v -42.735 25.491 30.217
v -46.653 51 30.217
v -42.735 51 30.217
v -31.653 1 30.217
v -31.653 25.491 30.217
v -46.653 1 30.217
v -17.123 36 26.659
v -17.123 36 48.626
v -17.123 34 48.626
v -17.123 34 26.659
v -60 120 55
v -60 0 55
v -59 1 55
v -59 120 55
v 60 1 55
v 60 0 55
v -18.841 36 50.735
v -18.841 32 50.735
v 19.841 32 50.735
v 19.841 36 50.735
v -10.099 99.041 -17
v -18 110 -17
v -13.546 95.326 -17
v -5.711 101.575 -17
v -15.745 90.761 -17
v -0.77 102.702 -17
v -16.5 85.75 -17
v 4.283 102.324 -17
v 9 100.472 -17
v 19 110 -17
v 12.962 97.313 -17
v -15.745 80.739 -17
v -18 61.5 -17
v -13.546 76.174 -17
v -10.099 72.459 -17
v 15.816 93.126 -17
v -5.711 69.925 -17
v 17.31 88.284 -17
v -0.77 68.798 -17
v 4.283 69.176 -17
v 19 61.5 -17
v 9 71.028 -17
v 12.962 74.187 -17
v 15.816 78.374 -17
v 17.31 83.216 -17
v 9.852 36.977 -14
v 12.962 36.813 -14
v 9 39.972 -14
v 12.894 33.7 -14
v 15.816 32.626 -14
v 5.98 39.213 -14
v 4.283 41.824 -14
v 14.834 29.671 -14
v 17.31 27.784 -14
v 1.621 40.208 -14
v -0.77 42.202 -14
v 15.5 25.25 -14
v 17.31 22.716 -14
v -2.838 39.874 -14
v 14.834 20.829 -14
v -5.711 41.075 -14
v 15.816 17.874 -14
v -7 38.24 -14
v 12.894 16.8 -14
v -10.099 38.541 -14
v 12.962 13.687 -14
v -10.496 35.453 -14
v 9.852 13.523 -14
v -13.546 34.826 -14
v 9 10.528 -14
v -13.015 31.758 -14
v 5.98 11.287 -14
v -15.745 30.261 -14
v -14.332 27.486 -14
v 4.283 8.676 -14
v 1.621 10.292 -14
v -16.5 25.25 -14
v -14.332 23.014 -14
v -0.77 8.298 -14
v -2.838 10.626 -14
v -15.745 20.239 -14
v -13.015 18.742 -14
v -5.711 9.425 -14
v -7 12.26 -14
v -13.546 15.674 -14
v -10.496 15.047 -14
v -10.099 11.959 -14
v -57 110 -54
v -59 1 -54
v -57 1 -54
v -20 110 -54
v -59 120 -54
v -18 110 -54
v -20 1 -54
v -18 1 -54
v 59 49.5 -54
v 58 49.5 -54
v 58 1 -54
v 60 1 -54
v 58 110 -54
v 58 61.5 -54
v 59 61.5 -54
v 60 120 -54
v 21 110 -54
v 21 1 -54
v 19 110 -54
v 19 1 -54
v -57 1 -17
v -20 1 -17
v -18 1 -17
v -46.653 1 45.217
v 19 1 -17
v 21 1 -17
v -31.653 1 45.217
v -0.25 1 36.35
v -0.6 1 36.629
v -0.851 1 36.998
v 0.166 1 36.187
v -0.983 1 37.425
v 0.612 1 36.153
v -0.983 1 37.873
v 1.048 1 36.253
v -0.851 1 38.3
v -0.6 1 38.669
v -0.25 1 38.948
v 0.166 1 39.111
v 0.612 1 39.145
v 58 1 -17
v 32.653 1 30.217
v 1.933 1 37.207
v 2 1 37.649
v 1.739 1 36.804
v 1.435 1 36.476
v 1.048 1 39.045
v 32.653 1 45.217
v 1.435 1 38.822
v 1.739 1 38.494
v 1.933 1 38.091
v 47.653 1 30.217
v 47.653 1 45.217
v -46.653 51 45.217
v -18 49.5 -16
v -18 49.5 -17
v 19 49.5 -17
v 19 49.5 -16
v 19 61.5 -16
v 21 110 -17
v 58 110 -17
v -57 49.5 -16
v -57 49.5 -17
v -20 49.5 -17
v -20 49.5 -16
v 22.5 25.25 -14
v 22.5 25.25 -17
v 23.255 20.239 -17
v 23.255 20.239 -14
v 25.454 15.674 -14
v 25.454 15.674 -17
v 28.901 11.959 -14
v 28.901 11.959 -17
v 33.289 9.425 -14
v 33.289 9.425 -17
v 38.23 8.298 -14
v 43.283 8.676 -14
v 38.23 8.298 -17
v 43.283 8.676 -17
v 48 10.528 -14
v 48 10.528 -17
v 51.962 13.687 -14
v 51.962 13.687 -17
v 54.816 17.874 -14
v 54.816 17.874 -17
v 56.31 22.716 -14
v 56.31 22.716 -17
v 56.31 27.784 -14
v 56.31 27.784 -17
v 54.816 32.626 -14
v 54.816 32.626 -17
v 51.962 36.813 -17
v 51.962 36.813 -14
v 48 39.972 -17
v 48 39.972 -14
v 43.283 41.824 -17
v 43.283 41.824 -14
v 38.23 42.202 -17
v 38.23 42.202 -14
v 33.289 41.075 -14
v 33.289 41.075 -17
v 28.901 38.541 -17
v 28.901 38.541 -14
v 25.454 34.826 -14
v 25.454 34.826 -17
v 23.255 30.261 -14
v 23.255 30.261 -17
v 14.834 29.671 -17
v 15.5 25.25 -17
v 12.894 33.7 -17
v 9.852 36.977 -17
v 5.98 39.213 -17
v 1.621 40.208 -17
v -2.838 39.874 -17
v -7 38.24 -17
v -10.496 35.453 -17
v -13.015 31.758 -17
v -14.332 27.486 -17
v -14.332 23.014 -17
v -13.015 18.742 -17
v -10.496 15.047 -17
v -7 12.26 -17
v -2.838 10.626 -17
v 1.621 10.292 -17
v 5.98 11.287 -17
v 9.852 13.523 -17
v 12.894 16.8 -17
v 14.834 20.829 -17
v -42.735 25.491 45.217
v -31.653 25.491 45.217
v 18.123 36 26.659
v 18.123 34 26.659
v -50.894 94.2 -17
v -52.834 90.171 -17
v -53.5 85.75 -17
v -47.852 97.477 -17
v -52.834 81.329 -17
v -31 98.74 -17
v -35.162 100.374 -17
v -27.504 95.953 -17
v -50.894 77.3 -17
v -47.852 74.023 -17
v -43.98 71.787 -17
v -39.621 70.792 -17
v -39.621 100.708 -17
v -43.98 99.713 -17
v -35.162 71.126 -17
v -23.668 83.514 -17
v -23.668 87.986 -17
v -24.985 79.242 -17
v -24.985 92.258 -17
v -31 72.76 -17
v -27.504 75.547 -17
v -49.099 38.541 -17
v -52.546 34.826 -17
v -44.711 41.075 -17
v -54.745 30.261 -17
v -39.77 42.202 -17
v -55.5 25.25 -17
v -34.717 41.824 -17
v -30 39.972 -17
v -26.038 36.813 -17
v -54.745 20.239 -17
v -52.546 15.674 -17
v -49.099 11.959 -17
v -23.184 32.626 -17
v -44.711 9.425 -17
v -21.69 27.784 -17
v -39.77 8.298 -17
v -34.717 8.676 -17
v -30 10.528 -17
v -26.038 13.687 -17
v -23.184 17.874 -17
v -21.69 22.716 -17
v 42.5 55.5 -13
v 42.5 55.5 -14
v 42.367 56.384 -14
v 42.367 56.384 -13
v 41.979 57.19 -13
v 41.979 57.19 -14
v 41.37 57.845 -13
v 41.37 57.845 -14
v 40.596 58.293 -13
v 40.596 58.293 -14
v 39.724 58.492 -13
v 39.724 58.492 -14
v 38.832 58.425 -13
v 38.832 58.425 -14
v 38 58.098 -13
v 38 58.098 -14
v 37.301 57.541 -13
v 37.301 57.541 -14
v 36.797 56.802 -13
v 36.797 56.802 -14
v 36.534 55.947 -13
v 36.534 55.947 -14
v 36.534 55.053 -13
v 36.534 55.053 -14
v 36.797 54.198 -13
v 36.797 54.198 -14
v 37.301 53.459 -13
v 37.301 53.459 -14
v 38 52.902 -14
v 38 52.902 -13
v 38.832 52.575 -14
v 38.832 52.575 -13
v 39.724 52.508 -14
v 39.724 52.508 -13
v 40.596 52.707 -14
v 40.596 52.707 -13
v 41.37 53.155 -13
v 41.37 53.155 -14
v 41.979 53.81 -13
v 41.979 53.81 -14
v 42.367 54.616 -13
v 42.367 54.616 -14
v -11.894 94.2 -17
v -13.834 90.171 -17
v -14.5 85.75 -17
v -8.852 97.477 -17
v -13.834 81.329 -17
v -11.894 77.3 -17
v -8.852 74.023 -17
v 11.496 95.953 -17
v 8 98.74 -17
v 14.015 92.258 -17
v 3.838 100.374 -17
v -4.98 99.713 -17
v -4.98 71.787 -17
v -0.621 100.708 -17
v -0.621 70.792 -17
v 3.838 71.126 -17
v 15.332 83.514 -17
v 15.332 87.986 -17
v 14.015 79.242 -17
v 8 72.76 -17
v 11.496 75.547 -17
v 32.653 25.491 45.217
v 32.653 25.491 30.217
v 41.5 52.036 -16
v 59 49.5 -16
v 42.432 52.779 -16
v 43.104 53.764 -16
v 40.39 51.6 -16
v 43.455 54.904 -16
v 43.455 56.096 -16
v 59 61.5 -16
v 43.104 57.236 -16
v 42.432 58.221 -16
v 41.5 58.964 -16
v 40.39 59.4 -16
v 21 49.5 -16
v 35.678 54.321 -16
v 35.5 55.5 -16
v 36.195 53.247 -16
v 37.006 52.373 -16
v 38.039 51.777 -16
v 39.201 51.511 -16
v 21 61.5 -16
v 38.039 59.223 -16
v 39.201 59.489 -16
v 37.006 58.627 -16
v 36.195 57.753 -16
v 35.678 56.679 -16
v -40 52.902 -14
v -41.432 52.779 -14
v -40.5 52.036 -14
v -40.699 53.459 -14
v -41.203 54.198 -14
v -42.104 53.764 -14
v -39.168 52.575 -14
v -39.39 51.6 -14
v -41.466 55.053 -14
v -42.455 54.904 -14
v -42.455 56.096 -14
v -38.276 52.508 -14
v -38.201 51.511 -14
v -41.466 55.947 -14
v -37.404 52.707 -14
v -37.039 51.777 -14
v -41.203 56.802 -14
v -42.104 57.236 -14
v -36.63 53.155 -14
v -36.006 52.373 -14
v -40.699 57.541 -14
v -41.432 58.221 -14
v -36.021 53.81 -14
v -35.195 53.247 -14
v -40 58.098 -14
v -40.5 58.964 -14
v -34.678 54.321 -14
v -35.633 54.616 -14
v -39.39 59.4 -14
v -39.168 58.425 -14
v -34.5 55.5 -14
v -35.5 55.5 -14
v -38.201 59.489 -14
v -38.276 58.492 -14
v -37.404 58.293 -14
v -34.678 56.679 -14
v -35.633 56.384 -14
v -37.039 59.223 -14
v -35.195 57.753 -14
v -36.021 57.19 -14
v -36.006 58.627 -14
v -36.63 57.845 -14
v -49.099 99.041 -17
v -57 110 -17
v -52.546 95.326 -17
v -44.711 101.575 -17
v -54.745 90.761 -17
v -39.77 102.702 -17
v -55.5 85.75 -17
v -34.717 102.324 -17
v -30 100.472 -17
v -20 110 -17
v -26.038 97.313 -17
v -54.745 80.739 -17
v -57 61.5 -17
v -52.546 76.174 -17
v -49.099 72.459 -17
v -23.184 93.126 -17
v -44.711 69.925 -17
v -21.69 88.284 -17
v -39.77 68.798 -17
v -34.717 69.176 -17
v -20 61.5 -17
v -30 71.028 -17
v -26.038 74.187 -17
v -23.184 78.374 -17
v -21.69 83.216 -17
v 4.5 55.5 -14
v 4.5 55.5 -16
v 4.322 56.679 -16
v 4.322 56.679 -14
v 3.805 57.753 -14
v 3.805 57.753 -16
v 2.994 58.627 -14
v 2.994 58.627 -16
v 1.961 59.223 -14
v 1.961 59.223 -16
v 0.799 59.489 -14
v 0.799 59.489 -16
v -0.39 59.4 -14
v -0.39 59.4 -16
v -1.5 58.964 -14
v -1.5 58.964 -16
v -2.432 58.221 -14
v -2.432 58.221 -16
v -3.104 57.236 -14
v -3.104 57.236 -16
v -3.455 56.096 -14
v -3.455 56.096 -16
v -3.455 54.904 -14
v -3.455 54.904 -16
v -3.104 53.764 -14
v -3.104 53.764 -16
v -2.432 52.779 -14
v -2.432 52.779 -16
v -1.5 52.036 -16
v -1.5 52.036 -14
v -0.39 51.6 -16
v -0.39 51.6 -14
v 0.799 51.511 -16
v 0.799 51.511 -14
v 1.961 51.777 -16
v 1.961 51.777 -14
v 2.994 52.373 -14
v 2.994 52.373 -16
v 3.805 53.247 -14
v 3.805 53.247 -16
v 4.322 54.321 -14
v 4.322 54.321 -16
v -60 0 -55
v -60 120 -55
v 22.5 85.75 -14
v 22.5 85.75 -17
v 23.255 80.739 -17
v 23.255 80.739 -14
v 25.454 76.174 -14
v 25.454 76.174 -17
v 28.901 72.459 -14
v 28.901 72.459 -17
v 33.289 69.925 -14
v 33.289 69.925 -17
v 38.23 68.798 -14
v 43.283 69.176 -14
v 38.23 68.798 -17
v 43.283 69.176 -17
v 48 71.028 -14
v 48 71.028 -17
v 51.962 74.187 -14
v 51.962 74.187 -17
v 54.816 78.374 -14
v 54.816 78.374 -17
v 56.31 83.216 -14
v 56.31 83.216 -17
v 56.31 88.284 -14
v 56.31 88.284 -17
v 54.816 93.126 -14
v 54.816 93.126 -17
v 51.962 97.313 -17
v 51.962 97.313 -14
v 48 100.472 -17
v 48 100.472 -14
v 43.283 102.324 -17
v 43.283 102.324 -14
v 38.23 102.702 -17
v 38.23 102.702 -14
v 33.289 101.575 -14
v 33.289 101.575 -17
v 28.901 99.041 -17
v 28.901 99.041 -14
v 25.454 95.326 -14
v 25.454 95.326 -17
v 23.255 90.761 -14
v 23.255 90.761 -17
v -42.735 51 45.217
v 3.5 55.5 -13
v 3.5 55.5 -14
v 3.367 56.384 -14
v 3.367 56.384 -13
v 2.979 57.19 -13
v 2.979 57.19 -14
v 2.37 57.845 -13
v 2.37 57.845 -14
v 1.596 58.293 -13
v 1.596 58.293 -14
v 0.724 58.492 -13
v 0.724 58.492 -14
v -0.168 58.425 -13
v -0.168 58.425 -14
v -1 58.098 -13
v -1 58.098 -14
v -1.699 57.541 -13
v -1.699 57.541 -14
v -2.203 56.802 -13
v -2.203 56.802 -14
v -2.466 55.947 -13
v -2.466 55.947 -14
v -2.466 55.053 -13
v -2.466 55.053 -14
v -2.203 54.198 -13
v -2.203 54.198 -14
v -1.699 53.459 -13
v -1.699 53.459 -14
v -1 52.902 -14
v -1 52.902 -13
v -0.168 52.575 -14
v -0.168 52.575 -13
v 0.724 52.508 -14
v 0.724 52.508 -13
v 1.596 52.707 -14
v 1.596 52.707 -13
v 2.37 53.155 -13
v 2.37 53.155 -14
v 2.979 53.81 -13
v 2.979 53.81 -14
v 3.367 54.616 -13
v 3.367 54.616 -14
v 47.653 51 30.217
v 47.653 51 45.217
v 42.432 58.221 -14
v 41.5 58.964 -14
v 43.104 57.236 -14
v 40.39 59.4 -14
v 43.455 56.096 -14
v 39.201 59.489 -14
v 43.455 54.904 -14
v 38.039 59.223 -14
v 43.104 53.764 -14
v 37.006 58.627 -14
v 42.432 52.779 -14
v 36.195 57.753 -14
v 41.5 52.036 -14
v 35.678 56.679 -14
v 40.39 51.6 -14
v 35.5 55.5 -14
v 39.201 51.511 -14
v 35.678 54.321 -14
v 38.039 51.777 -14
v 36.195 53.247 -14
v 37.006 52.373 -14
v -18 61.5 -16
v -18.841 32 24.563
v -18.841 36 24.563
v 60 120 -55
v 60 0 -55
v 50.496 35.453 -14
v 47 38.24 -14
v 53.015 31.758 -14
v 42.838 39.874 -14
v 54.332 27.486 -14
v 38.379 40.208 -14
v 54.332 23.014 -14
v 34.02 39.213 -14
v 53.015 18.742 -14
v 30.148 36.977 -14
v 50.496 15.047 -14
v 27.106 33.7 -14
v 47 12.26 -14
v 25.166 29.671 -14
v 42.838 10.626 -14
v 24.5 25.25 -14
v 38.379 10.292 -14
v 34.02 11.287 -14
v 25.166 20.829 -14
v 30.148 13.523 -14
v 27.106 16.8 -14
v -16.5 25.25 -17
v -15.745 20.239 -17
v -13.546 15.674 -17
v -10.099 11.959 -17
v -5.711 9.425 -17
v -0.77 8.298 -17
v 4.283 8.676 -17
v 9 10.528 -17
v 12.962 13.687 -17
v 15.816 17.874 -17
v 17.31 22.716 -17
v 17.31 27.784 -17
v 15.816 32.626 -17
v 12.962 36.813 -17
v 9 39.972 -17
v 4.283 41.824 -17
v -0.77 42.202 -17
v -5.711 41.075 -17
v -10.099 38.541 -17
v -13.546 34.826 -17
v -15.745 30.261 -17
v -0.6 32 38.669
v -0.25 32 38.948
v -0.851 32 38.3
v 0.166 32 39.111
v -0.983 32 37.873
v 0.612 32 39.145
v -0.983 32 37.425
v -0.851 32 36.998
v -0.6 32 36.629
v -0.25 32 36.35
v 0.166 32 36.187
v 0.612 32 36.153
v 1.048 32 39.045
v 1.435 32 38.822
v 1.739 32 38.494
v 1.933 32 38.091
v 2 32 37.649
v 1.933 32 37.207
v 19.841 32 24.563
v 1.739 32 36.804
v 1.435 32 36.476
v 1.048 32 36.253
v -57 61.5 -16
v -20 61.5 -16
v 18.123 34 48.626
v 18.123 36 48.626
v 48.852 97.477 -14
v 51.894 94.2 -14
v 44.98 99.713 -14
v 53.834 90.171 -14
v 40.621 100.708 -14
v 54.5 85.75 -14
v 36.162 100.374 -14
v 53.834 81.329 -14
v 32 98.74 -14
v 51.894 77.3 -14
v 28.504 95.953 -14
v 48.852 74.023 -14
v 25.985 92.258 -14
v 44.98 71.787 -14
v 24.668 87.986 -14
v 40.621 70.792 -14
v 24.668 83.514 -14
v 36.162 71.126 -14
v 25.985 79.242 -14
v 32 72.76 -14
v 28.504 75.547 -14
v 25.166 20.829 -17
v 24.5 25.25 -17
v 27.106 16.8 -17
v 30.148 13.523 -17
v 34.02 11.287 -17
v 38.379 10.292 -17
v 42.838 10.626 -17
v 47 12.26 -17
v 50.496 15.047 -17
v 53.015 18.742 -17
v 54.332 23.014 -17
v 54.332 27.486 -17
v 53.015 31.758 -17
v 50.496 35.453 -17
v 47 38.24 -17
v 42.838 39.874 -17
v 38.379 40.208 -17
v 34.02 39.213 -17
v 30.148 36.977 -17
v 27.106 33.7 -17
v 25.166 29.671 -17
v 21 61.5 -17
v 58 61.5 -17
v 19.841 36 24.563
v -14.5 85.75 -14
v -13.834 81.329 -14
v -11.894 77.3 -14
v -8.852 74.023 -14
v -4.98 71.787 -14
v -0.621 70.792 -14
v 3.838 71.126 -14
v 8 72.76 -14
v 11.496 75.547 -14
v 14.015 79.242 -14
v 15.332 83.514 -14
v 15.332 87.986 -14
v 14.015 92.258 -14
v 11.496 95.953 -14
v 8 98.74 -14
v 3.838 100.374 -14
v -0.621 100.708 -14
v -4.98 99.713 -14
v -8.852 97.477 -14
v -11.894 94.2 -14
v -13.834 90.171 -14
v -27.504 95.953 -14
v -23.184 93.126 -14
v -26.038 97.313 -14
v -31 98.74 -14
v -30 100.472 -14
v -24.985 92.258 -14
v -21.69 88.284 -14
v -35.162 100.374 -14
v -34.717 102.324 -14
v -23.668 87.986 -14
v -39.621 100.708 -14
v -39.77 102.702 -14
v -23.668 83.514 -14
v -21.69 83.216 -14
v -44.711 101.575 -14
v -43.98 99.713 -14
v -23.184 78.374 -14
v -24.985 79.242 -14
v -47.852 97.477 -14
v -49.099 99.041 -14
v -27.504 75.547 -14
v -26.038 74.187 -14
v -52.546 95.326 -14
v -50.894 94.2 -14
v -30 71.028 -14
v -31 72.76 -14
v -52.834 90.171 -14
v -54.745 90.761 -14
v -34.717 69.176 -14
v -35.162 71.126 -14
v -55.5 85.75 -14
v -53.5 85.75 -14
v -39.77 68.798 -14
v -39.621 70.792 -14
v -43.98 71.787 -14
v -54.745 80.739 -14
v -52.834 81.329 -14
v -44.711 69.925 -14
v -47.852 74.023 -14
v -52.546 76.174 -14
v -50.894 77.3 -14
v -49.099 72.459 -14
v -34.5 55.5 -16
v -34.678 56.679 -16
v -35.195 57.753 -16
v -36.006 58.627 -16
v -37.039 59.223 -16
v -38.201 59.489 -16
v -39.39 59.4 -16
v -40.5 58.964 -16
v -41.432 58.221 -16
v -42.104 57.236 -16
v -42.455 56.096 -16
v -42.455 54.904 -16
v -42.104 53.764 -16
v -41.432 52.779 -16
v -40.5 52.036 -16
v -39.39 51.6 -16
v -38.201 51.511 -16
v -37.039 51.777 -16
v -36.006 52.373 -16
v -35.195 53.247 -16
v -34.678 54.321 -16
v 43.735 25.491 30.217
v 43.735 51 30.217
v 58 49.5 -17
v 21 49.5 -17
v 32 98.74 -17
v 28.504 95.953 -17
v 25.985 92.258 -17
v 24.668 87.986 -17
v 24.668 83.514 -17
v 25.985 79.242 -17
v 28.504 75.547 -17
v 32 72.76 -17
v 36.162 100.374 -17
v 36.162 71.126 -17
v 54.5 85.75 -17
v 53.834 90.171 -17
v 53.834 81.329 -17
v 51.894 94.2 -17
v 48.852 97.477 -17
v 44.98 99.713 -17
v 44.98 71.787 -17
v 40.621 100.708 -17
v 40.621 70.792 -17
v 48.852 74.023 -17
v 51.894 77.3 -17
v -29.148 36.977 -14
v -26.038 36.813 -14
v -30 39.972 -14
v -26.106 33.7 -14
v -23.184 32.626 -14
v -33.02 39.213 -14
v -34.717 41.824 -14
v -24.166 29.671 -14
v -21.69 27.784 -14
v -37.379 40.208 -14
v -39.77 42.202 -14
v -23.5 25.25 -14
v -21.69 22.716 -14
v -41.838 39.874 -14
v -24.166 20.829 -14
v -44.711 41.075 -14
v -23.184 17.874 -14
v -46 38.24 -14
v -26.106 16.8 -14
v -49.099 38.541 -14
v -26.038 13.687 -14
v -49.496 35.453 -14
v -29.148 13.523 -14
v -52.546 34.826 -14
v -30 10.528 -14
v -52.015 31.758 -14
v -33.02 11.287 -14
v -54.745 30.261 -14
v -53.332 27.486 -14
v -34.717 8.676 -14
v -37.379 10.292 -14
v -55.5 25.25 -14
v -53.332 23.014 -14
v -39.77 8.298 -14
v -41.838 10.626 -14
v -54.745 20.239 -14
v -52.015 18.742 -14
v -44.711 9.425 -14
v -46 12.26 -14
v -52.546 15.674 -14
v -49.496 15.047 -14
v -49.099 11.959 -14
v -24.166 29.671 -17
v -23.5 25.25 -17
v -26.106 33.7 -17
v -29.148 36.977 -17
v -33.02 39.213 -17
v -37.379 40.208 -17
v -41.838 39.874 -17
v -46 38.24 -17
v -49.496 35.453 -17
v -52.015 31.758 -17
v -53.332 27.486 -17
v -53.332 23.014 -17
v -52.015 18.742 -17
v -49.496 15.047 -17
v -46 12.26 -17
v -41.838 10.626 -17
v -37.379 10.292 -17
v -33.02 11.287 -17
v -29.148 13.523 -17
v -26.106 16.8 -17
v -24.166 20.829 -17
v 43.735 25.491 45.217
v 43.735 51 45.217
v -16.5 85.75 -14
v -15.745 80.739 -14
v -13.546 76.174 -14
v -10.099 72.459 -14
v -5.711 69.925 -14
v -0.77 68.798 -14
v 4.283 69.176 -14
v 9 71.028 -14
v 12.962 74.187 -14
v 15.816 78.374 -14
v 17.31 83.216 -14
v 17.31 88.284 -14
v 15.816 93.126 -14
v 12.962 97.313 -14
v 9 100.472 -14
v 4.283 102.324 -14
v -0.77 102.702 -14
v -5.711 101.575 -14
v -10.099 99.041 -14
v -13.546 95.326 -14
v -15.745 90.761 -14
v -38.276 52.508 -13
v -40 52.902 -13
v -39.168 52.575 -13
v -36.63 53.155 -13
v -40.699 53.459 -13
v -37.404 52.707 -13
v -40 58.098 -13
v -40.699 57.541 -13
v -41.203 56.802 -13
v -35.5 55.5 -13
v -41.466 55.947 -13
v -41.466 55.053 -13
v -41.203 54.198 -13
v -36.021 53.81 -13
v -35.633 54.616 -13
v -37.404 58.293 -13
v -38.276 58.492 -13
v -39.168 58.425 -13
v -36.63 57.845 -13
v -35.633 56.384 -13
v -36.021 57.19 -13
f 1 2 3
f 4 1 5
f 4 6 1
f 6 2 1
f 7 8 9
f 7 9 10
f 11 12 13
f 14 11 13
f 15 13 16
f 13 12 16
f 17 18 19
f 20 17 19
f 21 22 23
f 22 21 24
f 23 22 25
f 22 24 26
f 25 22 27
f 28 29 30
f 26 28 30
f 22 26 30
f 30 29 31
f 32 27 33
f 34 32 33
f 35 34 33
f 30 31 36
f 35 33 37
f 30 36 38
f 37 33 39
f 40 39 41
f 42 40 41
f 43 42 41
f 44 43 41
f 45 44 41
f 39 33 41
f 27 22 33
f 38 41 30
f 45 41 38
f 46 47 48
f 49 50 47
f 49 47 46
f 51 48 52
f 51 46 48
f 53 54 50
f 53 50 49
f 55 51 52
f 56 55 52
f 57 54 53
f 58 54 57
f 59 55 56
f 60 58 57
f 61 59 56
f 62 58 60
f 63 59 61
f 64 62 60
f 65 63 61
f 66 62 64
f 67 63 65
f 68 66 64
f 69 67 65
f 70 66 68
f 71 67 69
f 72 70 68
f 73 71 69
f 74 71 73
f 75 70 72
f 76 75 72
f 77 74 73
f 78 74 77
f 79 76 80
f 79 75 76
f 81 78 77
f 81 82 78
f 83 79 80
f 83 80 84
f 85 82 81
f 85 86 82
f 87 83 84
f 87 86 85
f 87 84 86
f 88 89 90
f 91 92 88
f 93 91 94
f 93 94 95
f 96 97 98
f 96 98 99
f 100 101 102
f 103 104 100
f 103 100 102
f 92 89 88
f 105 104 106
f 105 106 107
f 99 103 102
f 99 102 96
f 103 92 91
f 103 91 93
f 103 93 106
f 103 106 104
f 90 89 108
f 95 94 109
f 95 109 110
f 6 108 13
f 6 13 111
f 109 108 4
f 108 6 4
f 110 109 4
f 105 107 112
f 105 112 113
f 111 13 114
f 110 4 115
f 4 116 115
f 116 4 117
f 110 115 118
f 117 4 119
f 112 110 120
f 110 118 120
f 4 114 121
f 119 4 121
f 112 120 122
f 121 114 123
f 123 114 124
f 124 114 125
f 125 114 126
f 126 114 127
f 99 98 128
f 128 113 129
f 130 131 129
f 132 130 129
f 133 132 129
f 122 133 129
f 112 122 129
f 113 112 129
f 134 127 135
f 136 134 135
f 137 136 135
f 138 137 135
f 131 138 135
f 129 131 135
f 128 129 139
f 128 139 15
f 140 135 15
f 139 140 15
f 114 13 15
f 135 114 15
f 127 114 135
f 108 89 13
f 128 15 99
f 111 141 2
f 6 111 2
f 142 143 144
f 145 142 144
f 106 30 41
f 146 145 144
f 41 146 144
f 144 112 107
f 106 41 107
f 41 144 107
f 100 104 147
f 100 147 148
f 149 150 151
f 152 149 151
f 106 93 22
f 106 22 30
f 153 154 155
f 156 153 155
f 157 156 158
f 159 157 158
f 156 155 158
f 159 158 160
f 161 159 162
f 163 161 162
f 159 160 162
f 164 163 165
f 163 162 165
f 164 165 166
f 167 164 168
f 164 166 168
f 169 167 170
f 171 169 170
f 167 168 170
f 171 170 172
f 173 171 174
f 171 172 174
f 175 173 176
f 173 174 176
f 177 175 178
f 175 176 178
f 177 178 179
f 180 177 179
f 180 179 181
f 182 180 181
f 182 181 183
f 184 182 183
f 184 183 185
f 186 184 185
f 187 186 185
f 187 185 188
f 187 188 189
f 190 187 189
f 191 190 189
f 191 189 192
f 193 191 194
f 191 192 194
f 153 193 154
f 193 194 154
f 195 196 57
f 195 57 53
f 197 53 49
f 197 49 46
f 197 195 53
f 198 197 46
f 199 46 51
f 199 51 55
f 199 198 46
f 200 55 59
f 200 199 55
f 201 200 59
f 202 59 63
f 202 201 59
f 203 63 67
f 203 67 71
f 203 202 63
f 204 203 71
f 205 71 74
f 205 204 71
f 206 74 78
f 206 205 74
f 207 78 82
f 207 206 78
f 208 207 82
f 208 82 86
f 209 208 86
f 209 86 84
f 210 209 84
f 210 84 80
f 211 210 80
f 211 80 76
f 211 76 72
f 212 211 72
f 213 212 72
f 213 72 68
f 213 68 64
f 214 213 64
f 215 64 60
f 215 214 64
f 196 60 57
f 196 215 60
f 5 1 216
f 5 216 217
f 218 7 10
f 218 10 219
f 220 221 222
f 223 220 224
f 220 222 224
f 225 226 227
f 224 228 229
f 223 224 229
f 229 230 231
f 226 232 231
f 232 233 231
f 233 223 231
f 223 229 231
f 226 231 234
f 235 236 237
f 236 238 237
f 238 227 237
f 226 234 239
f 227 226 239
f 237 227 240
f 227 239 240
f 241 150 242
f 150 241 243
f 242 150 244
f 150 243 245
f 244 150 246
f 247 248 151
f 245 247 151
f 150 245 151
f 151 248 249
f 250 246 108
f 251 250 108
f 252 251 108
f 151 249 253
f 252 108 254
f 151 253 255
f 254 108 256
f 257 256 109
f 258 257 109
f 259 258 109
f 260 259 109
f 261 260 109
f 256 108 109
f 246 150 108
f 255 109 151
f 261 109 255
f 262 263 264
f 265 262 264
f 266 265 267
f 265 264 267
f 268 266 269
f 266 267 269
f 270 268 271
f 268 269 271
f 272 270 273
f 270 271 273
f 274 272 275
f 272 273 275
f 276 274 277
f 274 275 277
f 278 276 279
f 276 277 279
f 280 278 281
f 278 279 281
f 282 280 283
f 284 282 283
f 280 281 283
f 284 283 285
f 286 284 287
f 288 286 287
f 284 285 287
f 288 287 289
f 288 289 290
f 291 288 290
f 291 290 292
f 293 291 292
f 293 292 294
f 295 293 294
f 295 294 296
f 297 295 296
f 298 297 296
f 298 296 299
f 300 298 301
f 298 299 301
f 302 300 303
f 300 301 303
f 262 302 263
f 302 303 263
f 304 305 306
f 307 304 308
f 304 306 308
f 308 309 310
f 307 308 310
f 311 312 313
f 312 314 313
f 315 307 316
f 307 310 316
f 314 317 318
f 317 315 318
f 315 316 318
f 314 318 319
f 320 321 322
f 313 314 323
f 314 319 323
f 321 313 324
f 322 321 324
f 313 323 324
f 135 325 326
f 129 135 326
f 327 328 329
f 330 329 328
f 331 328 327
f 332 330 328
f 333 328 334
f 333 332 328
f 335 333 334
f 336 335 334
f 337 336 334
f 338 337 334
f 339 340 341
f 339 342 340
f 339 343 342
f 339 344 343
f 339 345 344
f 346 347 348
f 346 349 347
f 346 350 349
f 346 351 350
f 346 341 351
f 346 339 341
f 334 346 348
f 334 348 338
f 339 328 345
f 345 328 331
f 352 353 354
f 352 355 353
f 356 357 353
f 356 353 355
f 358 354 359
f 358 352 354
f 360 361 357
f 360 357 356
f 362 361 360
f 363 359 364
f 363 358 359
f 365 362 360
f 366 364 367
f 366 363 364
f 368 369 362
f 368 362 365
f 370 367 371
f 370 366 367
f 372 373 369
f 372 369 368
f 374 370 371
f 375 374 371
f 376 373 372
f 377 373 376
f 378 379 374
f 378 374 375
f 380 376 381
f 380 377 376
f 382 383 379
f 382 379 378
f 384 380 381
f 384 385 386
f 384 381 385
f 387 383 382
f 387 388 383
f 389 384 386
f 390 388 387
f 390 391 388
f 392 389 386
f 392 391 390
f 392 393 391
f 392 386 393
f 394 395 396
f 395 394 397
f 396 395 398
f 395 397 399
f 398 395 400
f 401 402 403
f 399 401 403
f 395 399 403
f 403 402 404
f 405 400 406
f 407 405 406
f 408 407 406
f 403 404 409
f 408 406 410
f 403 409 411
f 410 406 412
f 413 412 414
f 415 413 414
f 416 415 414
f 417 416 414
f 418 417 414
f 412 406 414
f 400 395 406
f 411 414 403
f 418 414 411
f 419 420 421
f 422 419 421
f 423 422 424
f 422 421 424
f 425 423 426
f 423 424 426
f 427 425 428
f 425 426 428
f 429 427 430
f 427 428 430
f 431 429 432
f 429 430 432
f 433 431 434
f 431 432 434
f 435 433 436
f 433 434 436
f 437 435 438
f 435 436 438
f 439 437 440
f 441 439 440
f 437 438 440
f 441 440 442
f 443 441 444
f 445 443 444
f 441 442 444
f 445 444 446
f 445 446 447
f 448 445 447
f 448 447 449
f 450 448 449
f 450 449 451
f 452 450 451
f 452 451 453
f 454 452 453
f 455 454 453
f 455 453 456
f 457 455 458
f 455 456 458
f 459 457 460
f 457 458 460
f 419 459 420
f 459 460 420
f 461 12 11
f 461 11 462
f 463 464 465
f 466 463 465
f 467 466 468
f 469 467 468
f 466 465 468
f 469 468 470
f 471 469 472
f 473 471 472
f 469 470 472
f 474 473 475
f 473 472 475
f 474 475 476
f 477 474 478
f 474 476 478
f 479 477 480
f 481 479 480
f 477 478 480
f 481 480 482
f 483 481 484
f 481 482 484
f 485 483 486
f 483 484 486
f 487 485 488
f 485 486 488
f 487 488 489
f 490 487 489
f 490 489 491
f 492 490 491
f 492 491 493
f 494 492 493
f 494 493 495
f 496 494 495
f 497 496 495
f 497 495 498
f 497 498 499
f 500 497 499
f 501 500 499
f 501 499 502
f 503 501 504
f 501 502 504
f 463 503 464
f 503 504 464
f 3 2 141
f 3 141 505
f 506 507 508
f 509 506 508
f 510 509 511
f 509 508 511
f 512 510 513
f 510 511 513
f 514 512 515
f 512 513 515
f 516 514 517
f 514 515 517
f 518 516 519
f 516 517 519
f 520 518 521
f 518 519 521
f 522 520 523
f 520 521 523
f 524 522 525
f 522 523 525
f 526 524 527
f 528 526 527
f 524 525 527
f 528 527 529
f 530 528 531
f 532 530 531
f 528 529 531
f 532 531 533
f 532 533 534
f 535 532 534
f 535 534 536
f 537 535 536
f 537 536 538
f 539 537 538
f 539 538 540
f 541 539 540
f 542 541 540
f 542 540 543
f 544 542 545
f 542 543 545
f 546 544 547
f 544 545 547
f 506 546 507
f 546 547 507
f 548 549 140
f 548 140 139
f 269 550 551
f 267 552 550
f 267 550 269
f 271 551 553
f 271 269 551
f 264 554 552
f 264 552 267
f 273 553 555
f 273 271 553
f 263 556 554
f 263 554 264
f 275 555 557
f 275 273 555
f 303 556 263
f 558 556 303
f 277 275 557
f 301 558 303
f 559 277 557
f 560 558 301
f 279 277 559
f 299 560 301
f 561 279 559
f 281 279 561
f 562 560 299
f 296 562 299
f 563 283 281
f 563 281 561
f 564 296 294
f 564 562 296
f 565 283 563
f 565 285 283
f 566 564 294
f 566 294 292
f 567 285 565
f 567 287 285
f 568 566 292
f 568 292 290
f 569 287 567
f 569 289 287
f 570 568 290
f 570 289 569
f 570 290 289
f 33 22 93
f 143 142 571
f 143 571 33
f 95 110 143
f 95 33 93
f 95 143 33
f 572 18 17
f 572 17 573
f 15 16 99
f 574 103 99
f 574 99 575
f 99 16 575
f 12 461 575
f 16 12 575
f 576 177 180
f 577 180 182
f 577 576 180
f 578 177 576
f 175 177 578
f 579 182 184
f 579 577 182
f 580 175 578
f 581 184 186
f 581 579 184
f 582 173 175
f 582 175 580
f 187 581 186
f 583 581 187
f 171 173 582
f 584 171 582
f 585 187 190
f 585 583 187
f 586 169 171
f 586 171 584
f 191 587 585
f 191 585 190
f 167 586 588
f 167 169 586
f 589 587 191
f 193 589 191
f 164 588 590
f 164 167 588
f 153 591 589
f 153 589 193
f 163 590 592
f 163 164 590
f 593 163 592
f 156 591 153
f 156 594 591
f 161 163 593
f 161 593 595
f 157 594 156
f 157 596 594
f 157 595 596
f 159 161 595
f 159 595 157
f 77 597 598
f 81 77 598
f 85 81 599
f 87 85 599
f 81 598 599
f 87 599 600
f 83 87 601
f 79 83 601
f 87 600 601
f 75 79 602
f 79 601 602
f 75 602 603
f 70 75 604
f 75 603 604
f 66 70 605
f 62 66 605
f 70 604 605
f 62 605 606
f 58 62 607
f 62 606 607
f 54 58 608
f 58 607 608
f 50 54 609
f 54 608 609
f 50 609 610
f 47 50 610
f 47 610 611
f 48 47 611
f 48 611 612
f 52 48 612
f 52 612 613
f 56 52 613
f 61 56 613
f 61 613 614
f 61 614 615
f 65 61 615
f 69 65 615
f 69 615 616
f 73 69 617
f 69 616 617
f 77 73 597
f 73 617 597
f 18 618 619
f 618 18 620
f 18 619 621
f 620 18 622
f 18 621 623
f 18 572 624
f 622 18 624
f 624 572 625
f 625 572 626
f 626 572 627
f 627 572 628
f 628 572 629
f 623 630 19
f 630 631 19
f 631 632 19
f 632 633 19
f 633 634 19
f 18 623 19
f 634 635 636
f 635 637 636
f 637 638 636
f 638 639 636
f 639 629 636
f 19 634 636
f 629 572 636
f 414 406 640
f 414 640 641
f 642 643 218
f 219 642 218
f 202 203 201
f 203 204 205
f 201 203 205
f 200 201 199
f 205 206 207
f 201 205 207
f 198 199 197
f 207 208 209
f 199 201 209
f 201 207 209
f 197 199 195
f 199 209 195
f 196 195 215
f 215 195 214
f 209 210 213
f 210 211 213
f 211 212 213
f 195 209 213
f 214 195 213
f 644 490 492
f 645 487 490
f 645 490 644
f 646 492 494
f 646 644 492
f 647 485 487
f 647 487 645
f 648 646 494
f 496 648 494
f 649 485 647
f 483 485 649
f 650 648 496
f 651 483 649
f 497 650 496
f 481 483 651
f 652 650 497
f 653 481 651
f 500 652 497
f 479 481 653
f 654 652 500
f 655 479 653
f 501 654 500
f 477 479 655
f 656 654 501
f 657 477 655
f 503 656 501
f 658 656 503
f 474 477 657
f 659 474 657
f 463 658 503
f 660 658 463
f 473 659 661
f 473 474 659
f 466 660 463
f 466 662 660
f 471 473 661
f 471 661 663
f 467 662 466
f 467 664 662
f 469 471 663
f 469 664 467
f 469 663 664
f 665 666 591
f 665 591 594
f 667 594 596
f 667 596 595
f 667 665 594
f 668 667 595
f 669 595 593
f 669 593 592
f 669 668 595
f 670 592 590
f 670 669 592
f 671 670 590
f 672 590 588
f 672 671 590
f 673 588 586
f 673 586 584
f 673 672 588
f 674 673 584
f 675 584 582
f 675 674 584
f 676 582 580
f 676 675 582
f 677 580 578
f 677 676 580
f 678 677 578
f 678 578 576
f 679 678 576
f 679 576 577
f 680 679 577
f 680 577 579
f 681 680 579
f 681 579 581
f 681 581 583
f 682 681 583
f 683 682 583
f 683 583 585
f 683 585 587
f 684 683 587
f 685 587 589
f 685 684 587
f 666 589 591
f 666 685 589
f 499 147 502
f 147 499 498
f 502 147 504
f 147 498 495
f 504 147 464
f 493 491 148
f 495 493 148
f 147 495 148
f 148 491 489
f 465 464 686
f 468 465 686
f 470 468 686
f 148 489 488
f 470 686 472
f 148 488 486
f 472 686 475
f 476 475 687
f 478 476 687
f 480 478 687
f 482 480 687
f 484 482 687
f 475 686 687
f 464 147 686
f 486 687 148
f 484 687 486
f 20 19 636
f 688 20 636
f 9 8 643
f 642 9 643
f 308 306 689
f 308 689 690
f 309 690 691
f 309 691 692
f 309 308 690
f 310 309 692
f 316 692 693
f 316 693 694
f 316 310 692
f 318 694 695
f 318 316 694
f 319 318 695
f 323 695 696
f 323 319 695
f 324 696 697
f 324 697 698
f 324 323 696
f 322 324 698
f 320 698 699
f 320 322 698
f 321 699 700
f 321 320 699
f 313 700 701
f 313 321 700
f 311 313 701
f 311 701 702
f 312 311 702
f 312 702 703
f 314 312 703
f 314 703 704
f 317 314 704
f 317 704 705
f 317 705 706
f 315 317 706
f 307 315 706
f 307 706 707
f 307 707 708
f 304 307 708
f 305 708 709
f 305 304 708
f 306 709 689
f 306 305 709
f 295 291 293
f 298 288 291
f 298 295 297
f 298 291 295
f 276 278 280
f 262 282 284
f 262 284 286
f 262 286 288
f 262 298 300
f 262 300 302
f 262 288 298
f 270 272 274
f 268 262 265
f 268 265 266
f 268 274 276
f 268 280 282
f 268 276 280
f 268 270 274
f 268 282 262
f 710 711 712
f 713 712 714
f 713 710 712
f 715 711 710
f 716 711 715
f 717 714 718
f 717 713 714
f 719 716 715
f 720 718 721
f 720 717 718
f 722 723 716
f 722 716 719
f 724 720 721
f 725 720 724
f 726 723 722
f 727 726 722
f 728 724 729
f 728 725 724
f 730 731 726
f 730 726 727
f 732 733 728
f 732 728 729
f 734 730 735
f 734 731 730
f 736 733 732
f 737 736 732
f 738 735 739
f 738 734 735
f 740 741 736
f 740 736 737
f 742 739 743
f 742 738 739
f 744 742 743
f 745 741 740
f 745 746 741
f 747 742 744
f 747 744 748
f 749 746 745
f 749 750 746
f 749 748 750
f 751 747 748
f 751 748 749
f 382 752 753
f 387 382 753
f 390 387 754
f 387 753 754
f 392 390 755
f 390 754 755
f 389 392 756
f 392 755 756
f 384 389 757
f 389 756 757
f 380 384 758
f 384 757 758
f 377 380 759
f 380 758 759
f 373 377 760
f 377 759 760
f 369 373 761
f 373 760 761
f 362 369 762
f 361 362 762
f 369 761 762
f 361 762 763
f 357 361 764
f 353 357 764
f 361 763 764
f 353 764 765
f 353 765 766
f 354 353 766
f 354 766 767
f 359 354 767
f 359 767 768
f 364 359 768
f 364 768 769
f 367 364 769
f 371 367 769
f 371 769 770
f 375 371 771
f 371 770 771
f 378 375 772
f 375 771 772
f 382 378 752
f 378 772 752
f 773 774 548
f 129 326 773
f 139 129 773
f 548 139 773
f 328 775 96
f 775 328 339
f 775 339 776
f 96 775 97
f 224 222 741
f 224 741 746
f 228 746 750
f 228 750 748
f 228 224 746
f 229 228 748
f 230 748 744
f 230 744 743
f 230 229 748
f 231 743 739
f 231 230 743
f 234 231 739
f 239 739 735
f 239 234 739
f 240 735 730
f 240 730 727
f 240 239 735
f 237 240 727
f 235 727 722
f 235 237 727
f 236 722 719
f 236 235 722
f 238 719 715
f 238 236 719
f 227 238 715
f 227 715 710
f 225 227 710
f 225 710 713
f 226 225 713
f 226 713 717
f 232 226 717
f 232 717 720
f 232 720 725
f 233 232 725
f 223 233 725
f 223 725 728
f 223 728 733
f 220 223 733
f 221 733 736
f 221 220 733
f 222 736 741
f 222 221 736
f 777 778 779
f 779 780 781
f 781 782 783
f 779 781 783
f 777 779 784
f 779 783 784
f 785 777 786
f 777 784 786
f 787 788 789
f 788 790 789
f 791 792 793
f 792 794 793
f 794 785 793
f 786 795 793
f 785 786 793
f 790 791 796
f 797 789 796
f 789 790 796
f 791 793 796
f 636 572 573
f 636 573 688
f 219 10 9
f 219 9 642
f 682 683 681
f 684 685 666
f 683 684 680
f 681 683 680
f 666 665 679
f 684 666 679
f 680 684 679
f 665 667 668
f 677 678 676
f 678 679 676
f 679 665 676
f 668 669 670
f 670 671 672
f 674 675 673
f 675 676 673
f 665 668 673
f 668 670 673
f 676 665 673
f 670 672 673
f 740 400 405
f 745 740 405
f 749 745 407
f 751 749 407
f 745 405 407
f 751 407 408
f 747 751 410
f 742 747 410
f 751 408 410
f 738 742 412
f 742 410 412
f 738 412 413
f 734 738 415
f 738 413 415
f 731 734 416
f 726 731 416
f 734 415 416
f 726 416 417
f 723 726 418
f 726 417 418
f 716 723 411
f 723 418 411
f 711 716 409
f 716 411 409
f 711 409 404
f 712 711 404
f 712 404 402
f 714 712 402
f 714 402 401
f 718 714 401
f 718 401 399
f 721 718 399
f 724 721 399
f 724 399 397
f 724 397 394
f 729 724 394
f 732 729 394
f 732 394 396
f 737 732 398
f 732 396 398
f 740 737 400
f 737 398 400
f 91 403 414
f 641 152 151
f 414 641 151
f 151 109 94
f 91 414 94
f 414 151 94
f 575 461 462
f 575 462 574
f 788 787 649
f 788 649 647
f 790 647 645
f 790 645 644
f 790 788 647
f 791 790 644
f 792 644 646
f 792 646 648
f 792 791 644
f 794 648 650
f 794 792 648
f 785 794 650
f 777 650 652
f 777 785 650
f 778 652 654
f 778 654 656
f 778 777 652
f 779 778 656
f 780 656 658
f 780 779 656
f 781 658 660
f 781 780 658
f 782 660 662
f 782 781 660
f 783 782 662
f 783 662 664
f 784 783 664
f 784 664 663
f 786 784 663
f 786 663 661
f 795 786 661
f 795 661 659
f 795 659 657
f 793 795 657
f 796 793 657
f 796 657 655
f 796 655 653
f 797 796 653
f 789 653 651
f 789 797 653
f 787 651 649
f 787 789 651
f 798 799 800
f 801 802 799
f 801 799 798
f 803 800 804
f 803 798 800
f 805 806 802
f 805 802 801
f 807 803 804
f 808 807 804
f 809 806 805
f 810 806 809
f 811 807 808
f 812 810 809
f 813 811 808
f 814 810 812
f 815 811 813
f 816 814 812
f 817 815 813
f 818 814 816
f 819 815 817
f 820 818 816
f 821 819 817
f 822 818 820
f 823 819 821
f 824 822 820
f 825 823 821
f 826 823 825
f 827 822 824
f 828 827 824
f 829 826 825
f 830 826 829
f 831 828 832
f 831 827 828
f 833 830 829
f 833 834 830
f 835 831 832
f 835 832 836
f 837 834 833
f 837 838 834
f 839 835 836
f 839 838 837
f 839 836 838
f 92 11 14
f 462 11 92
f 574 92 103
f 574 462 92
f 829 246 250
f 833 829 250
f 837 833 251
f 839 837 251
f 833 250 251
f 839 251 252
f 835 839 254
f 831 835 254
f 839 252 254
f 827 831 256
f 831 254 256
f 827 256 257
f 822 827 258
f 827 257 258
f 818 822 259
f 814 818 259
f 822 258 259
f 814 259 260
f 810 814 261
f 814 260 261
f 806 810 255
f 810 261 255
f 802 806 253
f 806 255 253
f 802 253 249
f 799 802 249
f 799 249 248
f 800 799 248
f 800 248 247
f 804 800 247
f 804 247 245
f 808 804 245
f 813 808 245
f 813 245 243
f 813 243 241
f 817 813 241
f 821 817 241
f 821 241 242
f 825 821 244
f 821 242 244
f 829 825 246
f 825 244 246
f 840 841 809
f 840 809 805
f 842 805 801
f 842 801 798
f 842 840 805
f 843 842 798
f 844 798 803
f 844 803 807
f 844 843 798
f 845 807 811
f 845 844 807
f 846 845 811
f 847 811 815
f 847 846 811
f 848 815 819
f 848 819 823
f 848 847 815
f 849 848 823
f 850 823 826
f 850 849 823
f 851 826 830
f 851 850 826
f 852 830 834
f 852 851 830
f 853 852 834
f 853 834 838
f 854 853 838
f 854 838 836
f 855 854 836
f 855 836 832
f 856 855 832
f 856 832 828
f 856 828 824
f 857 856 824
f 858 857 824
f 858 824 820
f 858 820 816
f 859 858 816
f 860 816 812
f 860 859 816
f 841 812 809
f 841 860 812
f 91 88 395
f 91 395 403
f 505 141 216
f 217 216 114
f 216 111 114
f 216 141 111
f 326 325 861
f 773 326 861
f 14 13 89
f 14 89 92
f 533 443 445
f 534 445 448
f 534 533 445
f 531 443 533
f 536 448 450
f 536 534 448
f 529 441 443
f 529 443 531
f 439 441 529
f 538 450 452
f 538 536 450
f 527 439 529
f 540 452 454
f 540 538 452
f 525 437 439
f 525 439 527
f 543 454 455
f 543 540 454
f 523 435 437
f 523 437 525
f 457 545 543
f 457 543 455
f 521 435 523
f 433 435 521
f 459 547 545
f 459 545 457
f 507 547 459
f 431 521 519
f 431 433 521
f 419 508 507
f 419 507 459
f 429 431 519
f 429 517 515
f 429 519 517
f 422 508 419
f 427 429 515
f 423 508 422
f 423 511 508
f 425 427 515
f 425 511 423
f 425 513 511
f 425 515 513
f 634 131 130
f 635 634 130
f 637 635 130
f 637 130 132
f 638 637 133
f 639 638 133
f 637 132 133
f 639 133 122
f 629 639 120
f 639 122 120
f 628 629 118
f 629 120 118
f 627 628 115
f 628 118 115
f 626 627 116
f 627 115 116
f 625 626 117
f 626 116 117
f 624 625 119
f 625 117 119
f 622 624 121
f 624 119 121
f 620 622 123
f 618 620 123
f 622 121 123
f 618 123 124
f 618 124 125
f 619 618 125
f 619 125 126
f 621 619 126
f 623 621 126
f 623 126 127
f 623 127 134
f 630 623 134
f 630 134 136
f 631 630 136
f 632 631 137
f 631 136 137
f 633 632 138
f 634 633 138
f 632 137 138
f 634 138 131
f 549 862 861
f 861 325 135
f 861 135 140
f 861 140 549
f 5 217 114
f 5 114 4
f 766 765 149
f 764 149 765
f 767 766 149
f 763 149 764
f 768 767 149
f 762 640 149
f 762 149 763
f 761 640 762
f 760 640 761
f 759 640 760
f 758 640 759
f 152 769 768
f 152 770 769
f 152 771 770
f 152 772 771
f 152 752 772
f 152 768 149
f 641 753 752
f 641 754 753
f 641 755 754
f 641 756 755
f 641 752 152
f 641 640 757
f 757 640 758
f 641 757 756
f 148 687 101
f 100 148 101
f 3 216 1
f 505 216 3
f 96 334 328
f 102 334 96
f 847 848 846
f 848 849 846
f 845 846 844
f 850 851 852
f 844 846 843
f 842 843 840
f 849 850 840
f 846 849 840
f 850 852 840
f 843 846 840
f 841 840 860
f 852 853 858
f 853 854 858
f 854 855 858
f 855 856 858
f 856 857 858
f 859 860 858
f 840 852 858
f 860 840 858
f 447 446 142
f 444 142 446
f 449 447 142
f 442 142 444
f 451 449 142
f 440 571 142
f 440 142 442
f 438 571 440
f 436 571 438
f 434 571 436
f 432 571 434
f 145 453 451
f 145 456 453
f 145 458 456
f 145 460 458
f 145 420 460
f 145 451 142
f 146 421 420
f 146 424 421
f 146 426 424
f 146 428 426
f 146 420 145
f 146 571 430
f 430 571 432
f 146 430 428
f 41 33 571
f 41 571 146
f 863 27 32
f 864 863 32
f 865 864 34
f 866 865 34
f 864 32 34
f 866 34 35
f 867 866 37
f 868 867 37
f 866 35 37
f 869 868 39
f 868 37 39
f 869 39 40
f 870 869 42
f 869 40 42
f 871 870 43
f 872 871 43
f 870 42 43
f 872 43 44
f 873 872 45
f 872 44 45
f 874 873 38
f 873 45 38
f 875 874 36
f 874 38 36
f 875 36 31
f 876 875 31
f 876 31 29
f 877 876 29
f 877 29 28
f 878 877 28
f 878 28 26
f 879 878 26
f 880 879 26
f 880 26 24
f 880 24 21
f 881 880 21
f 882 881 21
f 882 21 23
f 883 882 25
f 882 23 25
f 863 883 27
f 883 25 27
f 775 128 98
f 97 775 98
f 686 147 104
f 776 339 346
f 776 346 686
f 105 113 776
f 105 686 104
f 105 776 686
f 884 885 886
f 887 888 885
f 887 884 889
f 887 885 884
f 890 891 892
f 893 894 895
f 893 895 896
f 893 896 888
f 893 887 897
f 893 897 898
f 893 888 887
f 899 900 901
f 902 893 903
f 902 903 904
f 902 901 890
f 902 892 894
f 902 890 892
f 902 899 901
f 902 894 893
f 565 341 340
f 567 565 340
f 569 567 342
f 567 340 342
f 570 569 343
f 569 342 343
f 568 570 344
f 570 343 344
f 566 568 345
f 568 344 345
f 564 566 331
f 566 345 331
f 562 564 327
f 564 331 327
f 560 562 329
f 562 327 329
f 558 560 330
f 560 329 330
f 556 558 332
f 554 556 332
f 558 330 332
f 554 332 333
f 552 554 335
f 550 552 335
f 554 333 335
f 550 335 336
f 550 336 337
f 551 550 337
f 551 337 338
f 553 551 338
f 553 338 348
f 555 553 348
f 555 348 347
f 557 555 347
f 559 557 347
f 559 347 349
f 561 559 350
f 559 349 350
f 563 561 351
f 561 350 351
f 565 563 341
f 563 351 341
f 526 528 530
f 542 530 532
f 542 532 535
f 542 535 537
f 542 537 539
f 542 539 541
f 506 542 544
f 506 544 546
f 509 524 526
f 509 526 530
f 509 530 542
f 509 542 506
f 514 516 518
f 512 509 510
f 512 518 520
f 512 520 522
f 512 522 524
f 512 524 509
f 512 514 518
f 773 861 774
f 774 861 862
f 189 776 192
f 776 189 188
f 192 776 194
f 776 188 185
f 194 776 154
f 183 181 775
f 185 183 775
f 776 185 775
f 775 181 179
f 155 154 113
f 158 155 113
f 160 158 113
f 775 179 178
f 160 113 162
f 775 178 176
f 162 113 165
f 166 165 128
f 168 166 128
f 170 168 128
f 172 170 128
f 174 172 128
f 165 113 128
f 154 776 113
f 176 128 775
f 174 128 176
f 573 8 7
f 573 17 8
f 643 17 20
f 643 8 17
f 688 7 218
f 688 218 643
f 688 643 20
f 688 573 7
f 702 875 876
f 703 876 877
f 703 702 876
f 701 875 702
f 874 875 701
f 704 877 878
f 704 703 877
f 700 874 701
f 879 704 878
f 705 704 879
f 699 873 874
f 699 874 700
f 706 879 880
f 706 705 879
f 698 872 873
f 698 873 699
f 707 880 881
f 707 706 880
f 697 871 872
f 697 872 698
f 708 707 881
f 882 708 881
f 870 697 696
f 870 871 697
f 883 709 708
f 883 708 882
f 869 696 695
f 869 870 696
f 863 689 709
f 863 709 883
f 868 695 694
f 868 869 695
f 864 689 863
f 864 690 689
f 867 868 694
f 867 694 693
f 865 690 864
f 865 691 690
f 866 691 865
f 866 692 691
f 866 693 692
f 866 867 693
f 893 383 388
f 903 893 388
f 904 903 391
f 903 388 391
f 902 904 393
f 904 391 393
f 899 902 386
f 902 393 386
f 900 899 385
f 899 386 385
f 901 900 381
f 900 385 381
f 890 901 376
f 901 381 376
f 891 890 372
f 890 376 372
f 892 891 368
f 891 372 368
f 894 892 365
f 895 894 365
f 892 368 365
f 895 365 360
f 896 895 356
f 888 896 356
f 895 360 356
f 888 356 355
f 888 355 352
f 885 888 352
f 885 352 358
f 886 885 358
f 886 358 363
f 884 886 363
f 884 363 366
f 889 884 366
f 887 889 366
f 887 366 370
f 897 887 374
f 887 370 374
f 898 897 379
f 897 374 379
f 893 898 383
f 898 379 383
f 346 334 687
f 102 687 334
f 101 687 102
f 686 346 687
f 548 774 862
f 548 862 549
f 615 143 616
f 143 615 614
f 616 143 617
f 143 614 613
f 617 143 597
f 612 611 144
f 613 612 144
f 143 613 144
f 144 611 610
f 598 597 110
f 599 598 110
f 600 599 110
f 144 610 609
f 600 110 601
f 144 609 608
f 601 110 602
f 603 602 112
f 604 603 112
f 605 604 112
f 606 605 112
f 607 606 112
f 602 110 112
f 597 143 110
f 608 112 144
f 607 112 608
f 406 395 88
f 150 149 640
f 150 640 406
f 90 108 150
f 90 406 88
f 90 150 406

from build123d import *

# Parameters (mm, degrees)
SKETCH_1_W           = 120
SKETCH_1_H           = 110
EXTRUDE_1_DEPTH      = 120
SKETCH_2_W           = 119
SKETCH_2_H           = 119
CUT_EXTRUDE_1_DEPTH  = 109
SKETCH_54_W          = 37
SKETCH_54_H          = 37
EXTRUDE_32_DEPTH     = 109
SKETCH_55_W          = 37
SKETCH_55_H          = 12
EXTRUDE_33_DEPTH     = 1
SKETCH_56_R          = 4
EXTRUDE_34_DEPTH     = 2
SKETCH_57_R          = 3
EXTRUDE_35_DEPTH     = 1
SKETCH_59_R          = 17
SKETCH_59_R_2        = 15
EXTRUDE_36_DEPTH     = 3
SKETCH_60_W          = 38
SKETCH_60_H          = 12
EXTRUDE_37_DEPTH     = 1
SKETCH_61_R          = 1.5
EXTRUDE_38_DEPTH     = 31
SKETCH_62_W          = 38.68188347
SKETCH_62_H          = 26.17234464
EXTRUDE_39_DEPTH     = 4
SKETCH_63_W          = 35.246239362
SKETCH_63_H          = 21.9665941
CUT_EXTRUDE_9_DEPTH  = 2
SKETCH_65_W          = 15
SKETCH_65_H          = 15
EXTRUDE_40_DEPTH     = 50
SKETCH_66_W          = 11.082023192
SKETCH_66_H          = 25.508987467
CUT_EXTRUDE_10_DEPTH = 30


with BuildPart() as part:
    # 스케치1 → 보스-돌출1 (new body)
    with BuildSketch(Plane(origin=(0, 0, 0), x_dir=(1, 0, 0), z_dir=(0, 1, 0))):
        Rectangle(SKETCH_1_W, SKETCH_1_H)
    extrude(amount=EXTRUDE_1_DEPTH)

    # 스케치2 → 컷-돌출1 (cut)
    with BuildSketch(Plane.XY.offset(55)):
        with Locations((0.5, 60.5)):
            Rectangle(SKETCH_2_W, SKETCH_2_H)
    extrude(amount=-CUT_EXTRUDE_1_DEPTH, mode=Mode.SUBTRACT)

    # 스케치54 → 보스-돌출32 (add)
    with BuildSketch(Plane(origin=(0, 1, 0), x_dir=(1, 0, 0), z_dir=(0, 1, 0))):
        with Locations((-38.5, 35.5)):
            Rectangle(SKETCH_54_W, SKETCH_54_H)
        with Locations((0.5, 35.5)):
            Rectangle(SKETCH_54_W, SKETCH_54_H)
        with Locations((39.5, 35.5)):
            Rectangle(SKETCH_54_W, SKETCH_54_H)
    extrude(amount=EXTRUDE_32_DEPTH)

    # 스케치55 → 보스-돌출33 (add)
    with BuildSketch(Plane.XY.offset(-17)):
        with Locations((-38.5, 55.5)):
            Rectangle(SKETCH_55_W, SKETCH_55_H)
        with Locations((0.5, 55.5)):
            Rectangle(SKETCH_55_W, SKETCH_55_H)
        with Locations((39.5, 55.5)):
            Rectangle(SKETCH_55_W, SKETCH_55_H)
    extrude(amount=EXTRUDE_33_DEPTH)

    # 스케치56 → 보스-돌출34 (add)
    with BuildSketch(Plane.XY.offset(-16)):
        with Locations((-38.5, 55.5)):
            Circle(SKETCH_56_R)
        with Locations(Location((39.5, 55.5, 0), (0, 0, 180))):
            Circle(SKETCH_56_R)
        with Locations((0.5, 55.5)):
            Circle(SKETCH_56_R)
    extrude(amount=EXTRUDE_34_DEPTH)

    # 스케치57 → 보스-돌출35 (add)
    with BuildSketch(Plane.XY.offset(-14)):
        with Locations((0.5, 55.5)):
            Circle(SKETCH_57_R)
        with Locations((39.5, 55.5)):
            Circle(SKETCH_57_R)
        with Locations((-38.5, 55.5)):
            Circle(SKETCH_57_R)
    extrude(amount=EXTRUDE_35_DEPTH)

    # 스케치59 → 보스-돌출36 (add)
    # profile 1 of 6: a face of its own
    with BuildSketch(Plane.XY.offset(-17)):
        with Locations(Location((-38.5, 25.25, 0), (0, 0, 180))):
            Circle(SKETCH_59_R)
        with Locations((-38.5, 25.25)):
            Circle(SKETCH_59_R_2, mode=Mode.SUBTRACT)
    # profile 2 of 6: a face of its own
    with BuildSketch(Plane.XY.offset(-17)):
        with Locations(Location((39.5, 25.25, 0), (0, 0, 180))):
            Circle(SKETCH_59_R)
        with Locations(Location((39.5, 25.25, 0), (0, 0, 180))):
            Circle(SKETCH_59_R_2, mode=Mode.SUBTRACT)
    # profile 3 of 6: a face of its own
    with BuildSketch(Plane.XY.offset(-17)):
        with Locations(Location((39.5, 85.75, 0), (0, 0, 180))):
            Circle(SKETCH_59_R)
        with Locations((39.5, 85.75)):
            Circle(SKETCH_59_R_2, mode=Mode.SUBTRACT)
    # profile 4 of 6: a face of its own
    with BuildSketch(Plane.XY.offset(-17)):
        with Locations(Location((-38.5, 85.75, 0), (0, 0, 180))):
            Circle(SKETCH_59_R)
        with Locations(Location((-38.5, 85.75, 0), (0, 0, 180))):
            Circle(SKETCH_59_R_2, mode=Mode.SUBTRACT)
    # profile 5 of 6: a face of its own
    with BuildSketch(Plane.XY.offset(-17)):
        with Locations(Location((0.5, 25.25, 0), (0, 0, 180))):
            Circle(SKETCH_59_R)
        with Locations((0.5, 25.25)):
            Circle(SKETCH_59_R_2, mode=Mode.SUBTRACT)
    # profile 6 of 6: a face of its own
    with BuildSketch(Plane.XY.offset(-17)):
        with Locations(Location((0.5, 85.75, 0), (0, 0, 180))):
            Circle(SKETCH_59_R)
        with Locations(Location((0.5, 85.75, 0), (0, 0, 180))):
            Circle(SKETCH_59_R_2, mode=Mode.SUBTRACT)
    extrude(amount=EXTRUDE_36_DEPTH)

    # 스케치60 → 보스-돌출37 (add)
    with BuildSketch(Plane(origin=(58, 0, 0), x_dir=(0, 0, -1), z_dir=(1, 0, 0))):
        with Locations((35, 55.5)):
            Rectangle(SKETCH_60_W, SKETCH_60_H)
    extrude(amount=EXTRUDE_37_DEPTH)

    # 스케치61 → 보스-돌출38 (add)
    with BuildSketch(Plane(origin=(0, 1, 0), x_dir=(1, 0, 0), z_dir=(0, 1, 0))):
        with Locations((0.5, -37.648978871)):
            Circle(SKETCH_61_R)
    extrude(amount=EXTRUDE_38_DEPTH)

    # 스케치62 → 보스-돌출39 (add)
    with BuildSketch(Plane(origin=(0, 32, 0), x_dir=(1, 0, 0), z_dir=(0, 1, 0))):
        with Locations((0.5, -37.648978871)):
            Rectangle(SKETCH_62_W, SKETCH_62_H)
    extrude(amount=EXTRUDE_39_DEPTH)

    # 스케치63 → 컷-돌출9 (cut)
    with BuildSketch(Plane(origin=(0, 36, 0), x_dir=(1, 0, 0), z_dir=(0, 1, 0))):
        with Locations((0.5, -37.642682595)):
            Rectangle(SKETCH_63_W, SKETCH_63_H)
    extrude(amount=-CUT_EXTRUDE_9_DEPTH, mode=Mode.SUBTRACT)

    # 스케치65 → 보스-돌출40 (add)
    with BuildSketch(Plane(origin=(0, 1, 0), x_dir=(1, 0, 0), z_dir=(0, 1, 0))):
        with Locations((-39.153156526, -37.716582515)):
            Rectangle(SKETCH_65_W, SKETCH_65_H)
        with Locations((40.153156526, -37.716582515)):
            Rectangle(SKETCH_65_W, SKETCH_65_H)
    extrude(amount=EXTRUDE_40_DEPTH)

    # 스케치66 → 컷-돌출10 (cut)
    with BuildSketch(Plane.XY.offset(45.216582515)):
        with Locations((-37.194168122, 38.245506267)):
            Rectangle(SKETCH_66_W, SKETCH_66_H)
        with Locations((38.194168122, 38.245506267)):
            Rectangle(SKETCH_66_W, SKETCH_66_H)
    extrude(amount=-CUT_EXTRUDE_10_DEPTH, mode=Mode.SUBTRACT)


solid = part.part
